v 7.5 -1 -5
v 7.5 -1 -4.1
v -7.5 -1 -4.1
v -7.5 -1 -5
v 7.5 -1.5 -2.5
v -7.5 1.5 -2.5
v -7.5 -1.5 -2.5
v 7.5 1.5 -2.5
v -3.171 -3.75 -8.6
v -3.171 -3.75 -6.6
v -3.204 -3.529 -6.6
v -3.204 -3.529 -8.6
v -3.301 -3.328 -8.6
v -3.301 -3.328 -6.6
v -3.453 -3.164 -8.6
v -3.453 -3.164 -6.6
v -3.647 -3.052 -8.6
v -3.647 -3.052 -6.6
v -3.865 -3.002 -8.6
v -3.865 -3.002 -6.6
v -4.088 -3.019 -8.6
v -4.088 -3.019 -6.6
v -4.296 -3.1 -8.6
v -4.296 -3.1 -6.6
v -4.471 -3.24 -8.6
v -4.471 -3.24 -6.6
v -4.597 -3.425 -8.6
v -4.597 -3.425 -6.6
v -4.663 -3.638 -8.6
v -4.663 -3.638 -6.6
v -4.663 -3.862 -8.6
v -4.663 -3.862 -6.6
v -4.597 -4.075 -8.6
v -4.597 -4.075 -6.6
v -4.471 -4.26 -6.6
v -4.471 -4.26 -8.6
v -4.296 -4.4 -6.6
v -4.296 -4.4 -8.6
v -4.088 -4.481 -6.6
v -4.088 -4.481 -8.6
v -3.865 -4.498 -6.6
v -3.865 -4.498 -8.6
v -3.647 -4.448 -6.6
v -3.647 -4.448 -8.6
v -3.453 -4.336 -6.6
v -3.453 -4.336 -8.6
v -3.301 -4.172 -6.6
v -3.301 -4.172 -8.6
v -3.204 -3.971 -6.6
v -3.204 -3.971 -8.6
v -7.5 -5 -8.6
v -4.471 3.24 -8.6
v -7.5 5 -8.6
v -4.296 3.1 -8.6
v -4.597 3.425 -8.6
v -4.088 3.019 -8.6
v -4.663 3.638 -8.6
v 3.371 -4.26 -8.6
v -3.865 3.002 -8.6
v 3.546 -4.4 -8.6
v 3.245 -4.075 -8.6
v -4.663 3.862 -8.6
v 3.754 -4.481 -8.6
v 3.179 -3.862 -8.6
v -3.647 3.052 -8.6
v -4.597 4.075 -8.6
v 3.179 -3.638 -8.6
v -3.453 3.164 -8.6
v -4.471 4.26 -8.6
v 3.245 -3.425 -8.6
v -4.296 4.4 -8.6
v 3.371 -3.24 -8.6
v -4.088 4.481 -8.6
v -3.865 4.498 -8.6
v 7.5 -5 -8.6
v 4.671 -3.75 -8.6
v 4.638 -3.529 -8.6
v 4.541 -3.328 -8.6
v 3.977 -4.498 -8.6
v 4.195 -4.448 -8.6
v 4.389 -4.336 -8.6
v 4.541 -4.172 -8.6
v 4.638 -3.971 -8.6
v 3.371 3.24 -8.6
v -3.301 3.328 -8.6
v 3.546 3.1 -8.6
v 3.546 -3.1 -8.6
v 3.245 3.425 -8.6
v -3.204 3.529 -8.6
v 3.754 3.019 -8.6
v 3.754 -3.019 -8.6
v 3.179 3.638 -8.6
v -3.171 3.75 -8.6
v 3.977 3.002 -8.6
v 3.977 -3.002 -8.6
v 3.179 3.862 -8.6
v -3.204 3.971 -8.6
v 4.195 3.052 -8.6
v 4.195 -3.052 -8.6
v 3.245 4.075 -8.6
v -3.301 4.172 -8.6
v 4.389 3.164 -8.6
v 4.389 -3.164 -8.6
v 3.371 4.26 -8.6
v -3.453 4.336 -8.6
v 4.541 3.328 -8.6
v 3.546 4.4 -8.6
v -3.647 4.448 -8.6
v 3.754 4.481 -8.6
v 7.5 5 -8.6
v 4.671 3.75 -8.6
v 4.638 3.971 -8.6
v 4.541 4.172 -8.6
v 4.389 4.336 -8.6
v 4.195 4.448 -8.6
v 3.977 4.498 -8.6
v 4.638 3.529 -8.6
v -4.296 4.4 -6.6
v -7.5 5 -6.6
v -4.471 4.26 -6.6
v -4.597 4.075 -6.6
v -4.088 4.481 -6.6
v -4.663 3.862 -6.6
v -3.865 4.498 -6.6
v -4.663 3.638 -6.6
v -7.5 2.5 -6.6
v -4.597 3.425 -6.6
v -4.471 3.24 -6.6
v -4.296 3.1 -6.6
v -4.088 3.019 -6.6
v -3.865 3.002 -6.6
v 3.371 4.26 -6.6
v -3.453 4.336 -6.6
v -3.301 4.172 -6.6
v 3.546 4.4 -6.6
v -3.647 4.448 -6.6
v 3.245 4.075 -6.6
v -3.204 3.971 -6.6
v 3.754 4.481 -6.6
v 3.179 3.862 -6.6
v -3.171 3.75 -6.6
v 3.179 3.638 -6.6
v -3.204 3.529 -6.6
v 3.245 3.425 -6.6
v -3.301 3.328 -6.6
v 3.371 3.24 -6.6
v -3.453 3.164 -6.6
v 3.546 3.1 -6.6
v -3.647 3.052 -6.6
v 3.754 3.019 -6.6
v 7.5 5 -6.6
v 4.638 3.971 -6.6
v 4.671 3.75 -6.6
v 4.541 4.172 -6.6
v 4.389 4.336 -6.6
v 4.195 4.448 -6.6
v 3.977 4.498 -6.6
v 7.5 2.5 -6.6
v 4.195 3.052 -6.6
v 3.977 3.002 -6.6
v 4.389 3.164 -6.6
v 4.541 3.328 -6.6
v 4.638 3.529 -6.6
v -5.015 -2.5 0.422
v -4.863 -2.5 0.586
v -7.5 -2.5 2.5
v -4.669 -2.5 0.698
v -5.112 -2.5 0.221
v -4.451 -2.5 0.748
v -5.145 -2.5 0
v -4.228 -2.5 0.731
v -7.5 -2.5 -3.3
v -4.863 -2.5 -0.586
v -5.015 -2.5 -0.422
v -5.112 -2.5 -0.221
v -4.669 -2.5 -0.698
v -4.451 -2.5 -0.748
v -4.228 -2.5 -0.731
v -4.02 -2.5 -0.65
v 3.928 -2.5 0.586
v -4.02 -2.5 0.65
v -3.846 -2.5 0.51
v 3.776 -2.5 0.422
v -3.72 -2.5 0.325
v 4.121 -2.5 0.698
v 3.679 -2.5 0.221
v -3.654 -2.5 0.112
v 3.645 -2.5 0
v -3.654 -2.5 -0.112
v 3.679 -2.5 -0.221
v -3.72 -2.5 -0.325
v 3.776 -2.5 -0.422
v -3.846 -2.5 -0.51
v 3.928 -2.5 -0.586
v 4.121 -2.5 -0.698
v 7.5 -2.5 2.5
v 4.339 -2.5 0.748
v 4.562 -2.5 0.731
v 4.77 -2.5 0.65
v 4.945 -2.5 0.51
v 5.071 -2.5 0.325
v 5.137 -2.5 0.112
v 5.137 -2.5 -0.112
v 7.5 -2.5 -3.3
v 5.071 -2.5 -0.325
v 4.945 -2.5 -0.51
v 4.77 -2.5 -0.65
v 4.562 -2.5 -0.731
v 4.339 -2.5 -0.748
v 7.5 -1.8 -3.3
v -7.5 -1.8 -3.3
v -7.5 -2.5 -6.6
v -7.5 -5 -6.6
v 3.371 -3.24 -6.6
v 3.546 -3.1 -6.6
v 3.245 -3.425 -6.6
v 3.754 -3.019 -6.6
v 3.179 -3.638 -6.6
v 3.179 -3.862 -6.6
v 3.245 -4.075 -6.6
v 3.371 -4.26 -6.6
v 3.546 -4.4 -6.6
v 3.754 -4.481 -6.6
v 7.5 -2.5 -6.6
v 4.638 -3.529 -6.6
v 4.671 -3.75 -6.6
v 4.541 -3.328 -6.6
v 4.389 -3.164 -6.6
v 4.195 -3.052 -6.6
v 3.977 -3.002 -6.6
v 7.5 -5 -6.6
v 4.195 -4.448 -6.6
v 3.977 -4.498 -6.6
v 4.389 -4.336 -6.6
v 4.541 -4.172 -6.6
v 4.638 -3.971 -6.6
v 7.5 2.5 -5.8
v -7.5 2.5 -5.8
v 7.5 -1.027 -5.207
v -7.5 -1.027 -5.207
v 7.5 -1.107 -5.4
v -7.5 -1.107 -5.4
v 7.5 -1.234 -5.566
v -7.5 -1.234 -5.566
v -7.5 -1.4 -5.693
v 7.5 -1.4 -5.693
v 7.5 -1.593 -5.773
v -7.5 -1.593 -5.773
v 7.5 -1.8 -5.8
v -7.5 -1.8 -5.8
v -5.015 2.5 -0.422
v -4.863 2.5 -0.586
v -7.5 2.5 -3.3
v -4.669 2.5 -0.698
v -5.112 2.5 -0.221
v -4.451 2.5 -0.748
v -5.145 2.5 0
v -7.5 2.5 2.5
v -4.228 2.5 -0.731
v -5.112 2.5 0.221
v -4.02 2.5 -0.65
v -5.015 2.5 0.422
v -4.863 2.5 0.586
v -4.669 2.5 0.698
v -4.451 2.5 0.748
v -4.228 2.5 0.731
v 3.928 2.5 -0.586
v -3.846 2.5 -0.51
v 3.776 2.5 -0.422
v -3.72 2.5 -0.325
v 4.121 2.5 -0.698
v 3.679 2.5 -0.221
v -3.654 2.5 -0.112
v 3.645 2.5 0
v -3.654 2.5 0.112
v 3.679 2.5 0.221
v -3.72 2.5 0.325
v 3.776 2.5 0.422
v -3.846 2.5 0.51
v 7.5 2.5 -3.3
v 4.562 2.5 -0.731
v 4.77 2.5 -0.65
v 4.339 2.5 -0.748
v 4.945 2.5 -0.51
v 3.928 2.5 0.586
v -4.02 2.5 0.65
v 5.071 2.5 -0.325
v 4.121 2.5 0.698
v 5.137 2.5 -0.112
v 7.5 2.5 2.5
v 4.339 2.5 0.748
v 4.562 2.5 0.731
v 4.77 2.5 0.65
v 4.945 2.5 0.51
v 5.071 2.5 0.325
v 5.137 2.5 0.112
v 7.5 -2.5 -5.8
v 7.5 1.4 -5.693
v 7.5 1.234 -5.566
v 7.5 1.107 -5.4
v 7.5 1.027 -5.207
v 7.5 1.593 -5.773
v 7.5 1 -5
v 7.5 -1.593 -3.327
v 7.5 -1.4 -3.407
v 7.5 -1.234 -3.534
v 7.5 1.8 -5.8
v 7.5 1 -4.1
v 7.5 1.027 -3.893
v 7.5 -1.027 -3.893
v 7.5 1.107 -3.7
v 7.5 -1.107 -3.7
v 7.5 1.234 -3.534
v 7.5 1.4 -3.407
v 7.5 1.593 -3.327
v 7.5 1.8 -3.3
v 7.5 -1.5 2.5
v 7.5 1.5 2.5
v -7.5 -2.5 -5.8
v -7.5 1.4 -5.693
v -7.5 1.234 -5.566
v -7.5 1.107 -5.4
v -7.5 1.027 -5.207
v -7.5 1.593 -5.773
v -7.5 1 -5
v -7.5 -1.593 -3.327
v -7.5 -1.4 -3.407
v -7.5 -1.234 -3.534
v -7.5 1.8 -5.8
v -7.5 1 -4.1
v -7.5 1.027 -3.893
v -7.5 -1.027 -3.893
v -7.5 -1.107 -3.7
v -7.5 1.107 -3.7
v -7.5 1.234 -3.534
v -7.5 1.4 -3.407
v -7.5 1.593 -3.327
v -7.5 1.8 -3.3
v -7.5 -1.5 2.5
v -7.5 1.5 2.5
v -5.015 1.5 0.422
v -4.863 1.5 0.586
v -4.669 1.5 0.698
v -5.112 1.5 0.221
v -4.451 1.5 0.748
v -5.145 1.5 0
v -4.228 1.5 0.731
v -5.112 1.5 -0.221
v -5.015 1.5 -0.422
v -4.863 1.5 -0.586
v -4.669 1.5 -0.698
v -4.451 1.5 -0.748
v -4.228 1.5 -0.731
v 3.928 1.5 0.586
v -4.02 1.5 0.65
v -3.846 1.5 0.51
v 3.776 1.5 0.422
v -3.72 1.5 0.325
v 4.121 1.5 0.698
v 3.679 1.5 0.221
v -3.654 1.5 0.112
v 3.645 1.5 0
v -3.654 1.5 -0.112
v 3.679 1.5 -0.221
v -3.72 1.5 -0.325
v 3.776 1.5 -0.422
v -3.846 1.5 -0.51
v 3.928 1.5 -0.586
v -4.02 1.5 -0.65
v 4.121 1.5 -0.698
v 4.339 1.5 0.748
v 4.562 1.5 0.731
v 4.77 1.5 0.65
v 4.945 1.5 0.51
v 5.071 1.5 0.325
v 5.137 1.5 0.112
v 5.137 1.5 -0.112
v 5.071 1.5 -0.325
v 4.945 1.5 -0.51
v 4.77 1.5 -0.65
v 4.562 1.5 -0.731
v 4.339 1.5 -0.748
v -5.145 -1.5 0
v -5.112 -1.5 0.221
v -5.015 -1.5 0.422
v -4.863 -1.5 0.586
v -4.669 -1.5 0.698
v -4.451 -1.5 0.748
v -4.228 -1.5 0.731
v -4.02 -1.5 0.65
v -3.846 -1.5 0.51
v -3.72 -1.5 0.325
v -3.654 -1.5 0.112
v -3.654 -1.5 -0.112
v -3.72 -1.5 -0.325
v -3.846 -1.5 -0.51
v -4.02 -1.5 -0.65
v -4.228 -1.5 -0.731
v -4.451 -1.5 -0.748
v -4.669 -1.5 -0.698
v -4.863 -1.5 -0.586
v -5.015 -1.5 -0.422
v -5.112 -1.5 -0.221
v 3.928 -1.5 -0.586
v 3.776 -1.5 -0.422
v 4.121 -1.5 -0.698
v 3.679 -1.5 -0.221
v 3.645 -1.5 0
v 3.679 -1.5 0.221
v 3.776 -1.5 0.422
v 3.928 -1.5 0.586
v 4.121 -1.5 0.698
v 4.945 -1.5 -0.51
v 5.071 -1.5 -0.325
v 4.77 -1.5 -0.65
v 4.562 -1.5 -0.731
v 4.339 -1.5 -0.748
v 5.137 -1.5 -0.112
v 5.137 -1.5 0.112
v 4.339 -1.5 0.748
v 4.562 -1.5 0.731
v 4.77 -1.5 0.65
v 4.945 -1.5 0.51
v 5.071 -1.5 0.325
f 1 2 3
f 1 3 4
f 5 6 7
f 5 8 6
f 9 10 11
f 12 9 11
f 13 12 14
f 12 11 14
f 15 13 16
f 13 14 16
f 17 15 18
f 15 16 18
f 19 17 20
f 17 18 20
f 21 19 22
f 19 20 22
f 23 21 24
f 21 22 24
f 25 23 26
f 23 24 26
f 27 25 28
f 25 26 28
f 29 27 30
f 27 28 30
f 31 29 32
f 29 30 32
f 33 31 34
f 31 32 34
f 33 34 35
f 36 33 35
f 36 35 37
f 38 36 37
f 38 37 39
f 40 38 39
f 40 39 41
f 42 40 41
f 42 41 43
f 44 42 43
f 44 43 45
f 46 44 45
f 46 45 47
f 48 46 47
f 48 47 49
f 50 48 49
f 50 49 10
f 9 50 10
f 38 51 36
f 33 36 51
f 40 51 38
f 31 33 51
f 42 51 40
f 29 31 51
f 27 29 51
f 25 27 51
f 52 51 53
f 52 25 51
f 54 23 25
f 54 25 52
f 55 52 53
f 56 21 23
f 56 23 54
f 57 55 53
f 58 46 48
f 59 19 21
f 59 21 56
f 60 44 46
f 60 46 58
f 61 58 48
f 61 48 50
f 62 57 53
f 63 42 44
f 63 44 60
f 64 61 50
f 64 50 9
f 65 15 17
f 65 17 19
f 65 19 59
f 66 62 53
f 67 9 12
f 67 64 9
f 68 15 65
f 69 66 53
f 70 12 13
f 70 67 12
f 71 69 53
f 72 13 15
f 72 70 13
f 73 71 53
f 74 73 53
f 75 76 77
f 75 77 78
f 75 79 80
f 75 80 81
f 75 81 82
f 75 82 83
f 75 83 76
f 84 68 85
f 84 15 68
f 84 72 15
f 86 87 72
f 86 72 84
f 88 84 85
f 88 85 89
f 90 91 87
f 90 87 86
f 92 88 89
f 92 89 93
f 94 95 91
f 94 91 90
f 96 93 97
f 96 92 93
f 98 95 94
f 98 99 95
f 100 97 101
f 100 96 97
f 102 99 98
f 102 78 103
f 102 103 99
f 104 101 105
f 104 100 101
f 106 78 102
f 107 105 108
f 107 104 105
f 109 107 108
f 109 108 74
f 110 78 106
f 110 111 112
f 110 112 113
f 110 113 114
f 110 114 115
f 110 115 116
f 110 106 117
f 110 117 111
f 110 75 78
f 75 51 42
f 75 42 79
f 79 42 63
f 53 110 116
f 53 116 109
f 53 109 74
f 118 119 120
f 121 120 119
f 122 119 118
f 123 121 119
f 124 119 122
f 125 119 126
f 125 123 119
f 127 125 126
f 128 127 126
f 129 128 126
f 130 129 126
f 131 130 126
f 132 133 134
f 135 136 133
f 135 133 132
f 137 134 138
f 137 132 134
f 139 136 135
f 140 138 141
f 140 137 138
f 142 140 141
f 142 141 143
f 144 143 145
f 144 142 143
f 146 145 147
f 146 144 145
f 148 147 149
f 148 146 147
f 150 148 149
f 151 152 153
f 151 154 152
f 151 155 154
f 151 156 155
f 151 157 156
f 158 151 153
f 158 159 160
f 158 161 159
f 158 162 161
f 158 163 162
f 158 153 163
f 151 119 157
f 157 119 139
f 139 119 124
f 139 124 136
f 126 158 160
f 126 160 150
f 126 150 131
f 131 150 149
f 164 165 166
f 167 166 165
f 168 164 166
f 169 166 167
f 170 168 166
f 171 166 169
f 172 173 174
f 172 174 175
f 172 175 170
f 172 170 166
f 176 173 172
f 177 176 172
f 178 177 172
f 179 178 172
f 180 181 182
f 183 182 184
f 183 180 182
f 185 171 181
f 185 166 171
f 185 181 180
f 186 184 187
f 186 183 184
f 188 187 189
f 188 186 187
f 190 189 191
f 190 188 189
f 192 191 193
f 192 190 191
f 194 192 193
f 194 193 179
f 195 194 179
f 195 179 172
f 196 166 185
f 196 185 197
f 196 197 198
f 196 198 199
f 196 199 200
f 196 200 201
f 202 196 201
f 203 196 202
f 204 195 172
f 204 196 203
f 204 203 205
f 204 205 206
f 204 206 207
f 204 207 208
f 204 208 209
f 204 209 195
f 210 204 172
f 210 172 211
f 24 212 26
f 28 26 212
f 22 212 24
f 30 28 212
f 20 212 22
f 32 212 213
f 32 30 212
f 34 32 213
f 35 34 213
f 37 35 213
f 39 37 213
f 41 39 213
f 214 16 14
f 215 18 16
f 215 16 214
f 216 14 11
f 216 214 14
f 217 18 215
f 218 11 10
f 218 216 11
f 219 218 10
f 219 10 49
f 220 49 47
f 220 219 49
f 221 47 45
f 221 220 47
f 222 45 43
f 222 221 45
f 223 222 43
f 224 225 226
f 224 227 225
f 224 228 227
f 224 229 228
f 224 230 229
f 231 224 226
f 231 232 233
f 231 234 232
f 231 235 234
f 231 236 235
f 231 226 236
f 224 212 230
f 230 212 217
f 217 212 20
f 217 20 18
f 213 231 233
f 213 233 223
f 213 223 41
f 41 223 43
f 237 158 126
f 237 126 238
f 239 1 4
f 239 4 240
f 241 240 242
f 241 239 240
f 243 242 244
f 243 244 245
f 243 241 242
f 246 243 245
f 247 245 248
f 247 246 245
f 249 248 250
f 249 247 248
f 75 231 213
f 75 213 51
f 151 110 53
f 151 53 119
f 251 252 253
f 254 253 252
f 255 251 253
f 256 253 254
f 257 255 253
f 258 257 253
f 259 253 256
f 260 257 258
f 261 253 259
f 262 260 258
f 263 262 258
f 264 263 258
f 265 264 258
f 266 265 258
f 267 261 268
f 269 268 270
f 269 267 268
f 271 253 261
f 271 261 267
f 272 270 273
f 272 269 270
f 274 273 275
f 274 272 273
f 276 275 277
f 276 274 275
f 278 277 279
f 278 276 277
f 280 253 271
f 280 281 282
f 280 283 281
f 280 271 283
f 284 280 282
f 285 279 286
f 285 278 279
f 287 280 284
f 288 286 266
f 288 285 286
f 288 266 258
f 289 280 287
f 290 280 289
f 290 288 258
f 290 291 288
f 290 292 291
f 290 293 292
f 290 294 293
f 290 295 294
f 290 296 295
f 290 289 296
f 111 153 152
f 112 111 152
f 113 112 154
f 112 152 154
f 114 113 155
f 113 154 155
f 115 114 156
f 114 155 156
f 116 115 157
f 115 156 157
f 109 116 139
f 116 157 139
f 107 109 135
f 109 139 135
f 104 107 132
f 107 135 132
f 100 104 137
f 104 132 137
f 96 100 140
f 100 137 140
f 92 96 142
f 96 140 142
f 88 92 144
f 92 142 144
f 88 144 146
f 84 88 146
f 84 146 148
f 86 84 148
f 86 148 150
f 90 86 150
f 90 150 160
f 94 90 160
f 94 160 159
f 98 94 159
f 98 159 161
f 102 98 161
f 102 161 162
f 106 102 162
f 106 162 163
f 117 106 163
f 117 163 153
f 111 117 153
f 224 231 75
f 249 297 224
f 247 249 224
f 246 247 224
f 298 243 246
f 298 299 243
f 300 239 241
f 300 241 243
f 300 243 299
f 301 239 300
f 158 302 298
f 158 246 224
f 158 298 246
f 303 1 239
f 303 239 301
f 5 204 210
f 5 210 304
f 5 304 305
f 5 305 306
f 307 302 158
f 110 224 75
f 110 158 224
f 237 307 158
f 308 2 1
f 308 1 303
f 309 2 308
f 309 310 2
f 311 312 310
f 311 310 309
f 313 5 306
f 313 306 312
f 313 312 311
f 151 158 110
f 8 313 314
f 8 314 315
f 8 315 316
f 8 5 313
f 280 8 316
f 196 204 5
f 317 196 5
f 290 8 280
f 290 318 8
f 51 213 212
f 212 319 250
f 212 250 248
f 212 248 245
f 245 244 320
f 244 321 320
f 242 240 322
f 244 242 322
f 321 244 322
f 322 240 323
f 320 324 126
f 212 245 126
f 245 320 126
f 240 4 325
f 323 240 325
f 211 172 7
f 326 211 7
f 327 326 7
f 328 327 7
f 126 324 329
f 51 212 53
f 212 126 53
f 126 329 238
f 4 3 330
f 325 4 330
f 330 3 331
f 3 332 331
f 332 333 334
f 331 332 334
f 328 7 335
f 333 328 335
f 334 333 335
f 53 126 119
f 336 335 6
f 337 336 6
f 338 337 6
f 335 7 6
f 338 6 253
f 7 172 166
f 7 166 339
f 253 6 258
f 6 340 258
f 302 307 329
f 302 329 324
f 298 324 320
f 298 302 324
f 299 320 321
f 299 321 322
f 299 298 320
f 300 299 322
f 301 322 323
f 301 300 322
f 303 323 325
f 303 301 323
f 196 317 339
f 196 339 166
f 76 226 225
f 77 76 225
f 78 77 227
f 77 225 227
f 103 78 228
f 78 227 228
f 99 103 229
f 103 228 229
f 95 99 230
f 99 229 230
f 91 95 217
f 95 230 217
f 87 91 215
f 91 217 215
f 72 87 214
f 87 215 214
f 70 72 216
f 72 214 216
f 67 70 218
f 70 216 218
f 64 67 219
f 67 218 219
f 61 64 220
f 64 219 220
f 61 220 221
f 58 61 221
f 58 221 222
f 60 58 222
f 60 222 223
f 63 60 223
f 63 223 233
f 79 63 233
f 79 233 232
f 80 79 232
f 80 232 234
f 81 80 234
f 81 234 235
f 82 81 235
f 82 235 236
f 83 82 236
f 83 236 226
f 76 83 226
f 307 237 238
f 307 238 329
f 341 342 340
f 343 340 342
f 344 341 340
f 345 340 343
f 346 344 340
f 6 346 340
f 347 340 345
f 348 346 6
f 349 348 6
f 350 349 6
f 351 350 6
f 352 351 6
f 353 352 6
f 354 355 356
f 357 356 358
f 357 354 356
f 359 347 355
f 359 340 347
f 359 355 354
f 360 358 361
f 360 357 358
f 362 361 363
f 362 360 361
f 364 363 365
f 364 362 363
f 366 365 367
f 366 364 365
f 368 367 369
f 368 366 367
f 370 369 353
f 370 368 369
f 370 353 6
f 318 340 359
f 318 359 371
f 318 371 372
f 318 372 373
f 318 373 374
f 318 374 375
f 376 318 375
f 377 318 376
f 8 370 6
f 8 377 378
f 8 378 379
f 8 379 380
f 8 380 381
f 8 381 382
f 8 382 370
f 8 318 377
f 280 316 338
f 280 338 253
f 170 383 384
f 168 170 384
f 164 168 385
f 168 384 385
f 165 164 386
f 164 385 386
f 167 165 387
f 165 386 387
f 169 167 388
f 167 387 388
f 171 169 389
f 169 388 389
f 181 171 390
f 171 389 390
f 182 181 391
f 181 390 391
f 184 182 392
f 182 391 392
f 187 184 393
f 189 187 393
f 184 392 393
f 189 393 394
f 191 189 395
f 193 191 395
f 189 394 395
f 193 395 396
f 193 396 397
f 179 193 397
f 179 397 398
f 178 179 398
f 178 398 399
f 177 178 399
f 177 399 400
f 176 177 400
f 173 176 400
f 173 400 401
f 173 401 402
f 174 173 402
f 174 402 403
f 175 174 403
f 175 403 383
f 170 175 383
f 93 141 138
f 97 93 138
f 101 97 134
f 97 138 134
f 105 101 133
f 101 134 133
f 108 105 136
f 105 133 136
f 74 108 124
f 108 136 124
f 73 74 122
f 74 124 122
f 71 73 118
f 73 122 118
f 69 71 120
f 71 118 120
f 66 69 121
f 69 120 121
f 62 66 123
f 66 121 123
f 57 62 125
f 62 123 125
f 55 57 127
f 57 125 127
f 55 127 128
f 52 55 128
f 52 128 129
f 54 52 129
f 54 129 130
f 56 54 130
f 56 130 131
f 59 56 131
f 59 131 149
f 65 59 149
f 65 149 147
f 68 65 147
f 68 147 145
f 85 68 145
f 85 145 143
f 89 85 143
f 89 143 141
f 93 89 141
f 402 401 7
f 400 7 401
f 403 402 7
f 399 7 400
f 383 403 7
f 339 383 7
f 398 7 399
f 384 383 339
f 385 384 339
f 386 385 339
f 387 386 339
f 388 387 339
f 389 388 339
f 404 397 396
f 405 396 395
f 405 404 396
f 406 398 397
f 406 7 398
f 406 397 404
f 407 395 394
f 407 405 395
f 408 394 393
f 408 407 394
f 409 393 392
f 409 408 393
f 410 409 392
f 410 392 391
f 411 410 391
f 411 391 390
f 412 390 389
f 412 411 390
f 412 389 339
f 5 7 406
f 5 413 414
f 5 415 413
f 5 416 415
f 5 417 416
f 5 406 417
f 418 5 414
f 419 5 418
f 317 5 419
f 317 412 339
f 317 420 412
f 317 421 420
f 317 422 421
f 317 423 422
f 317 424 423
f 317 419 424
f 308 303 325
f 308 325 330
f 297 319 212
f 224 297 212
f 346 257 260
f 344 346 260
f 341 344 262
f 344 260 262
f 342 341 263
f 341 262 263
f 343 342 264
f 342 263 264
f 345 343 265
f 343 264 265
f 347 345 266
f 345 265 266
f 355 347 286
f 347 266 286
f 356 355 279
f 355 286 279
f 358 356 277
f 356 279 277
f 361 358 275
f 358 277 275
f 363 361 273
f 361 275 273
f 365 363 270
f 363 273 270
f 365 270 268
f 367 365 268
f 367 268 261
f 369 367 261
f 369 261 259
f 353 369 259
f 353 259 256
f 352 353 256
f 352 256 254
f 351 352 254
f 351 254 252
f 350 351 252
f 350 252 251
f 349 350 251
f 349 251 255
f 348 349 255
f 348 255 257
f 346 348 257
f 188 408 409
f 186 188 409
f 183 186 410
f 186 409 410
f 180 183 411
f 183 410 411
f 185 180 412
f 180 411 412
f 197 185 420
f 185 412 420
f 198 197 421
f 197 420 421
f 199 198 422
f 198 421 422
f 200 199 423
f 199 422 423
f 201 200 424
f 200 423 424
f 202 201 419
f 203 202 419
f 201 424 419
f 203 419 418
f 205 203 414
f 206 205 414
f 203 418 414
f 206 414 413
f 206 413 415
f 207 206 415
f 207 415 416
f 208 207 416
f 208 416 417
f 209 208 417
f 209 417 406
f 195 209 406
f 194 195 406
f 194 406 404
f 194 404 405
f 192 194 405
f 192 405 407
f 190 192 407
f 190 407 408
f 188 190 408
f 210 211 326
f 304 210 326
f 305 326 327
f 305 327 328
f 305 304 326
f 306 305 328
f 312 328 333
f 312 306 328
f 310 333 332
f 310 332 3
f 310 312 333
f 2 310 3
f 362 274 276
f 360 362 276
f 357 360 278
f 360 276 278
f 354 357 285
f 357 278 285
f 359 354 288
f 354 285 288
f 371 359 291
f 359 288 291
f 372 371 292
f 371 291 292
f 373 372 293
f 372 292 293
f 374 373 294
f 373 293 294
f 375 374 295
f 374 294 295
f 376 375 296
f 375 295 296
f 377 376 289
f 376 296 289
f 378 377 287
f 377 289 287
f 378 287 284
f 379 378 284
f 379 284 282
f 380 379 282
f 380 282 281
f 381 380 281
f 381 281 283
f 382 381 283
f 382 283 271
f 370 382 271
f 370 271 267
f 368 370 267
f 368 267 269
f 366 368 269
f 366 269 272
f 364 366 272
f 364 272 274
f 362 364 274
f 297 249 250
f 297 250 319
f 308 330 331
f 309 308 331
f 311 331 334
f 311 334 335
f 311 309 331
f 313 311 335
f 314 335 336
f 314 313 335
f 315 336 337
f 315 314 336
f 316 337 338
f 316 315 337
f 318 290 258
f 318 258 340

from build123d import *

# Parameters (mm, degrees)
F1_DEPTH = 7.5
F2_R     = 0.75
F3_DEPTH = 7.501
F4_R     = 0.75
F5_DEPTH = 2.001


with BuildPart() as f1:
    # F0 (on Right) → F1 (new body, symmetric)
    with BuildSketch(Plane.YZ):
        with BuildLine():
            Line((-1.5, -2.5), (-1.5, 2.5))
            Line((-1.5, 2.5), (-2.5, 2.5))
            Line((-2.5, 2.5), (-2.5, -3.3))
            Line((-2.5, -3.3), (-1.8, -3.3))
            ThreePointArc((-1.8, -3.3), (-1.234315, -3.534315), (-1, -4.1))
            Line((-1, -4.1), (-1, -5))
            ThreePointArc((-1, -5), (-1.234315, -5.565685), (-1.8, -5.8))
            Line((-1.8, -5.8), (-2.5, -5.8))
            Line((-2.5, -5.8), (-2.5, -6.6))
            Line((-2.5, -6.6), (2.5, -6.6))
            Line((2.5, -6.6), (2.5, -5.8))
            Line((2.5, -5.8), (1.8, -5.8))
            ThreePointArc((1.8, -5.8), (1.234315, -5.565685), (1, -5))
            Line((1, -5), (1, -4.1))
            ThreePointArc((1, -4.1), (1.234315, -3.534315), (1.8, -3.3))
            Line((1.8, -3.3), (2.5, -3.3))
            Line((2.5, -3.3), (2.5, 2.5))
            Line((2.5, 2.5), (1.5, 2.5))
            Line((1.5, 2.5), (1.5, -2.5))
            Line((1.5, -2.5), (-1.5, -2.5))
        make_face()
        Polygon((2.5, -6.6), (-2.5, -6.6), (-5, -6.6), (-5, -8.6), (5, -8.6), (5, -6.6), align=None)
    extrude(amount=F1_DEPTH, both=True)

    # F2 (on face) → F3 (cut, through all)
    with BuildSketch(Plane(origin=(0, 2.5, 0), x_dir=(-1, 0, 0), z_dir=(0, 1, 0))):
        with Locations((-4.395362, 0)):
            Circle(F2_R)
        with Locations((4.395362, 0)):
            Circle(F2_R)
    extrude(amount=-F3_DEPTH, mode=Mode.SUBTRACT)

    # F4 (on face) → F5 (cut, through all)
    with BuildSketch(Plane.XY.offset(-6.6)):
        with Locations((-3.921103, -3.75)):
            Circle(F4_R)
        with Locations((3.921103, -3.75)):
            Circle(F4_R)
        with Locations((3.921103, 3.75)):
            Circle(F4_R)
        with Locations((-3.921103, 3.75)):
            Circle(F4_R)
    extrude(amount=-F5_DEPTH, mode=Mode.SUBTRACT)


solid = f1.part
